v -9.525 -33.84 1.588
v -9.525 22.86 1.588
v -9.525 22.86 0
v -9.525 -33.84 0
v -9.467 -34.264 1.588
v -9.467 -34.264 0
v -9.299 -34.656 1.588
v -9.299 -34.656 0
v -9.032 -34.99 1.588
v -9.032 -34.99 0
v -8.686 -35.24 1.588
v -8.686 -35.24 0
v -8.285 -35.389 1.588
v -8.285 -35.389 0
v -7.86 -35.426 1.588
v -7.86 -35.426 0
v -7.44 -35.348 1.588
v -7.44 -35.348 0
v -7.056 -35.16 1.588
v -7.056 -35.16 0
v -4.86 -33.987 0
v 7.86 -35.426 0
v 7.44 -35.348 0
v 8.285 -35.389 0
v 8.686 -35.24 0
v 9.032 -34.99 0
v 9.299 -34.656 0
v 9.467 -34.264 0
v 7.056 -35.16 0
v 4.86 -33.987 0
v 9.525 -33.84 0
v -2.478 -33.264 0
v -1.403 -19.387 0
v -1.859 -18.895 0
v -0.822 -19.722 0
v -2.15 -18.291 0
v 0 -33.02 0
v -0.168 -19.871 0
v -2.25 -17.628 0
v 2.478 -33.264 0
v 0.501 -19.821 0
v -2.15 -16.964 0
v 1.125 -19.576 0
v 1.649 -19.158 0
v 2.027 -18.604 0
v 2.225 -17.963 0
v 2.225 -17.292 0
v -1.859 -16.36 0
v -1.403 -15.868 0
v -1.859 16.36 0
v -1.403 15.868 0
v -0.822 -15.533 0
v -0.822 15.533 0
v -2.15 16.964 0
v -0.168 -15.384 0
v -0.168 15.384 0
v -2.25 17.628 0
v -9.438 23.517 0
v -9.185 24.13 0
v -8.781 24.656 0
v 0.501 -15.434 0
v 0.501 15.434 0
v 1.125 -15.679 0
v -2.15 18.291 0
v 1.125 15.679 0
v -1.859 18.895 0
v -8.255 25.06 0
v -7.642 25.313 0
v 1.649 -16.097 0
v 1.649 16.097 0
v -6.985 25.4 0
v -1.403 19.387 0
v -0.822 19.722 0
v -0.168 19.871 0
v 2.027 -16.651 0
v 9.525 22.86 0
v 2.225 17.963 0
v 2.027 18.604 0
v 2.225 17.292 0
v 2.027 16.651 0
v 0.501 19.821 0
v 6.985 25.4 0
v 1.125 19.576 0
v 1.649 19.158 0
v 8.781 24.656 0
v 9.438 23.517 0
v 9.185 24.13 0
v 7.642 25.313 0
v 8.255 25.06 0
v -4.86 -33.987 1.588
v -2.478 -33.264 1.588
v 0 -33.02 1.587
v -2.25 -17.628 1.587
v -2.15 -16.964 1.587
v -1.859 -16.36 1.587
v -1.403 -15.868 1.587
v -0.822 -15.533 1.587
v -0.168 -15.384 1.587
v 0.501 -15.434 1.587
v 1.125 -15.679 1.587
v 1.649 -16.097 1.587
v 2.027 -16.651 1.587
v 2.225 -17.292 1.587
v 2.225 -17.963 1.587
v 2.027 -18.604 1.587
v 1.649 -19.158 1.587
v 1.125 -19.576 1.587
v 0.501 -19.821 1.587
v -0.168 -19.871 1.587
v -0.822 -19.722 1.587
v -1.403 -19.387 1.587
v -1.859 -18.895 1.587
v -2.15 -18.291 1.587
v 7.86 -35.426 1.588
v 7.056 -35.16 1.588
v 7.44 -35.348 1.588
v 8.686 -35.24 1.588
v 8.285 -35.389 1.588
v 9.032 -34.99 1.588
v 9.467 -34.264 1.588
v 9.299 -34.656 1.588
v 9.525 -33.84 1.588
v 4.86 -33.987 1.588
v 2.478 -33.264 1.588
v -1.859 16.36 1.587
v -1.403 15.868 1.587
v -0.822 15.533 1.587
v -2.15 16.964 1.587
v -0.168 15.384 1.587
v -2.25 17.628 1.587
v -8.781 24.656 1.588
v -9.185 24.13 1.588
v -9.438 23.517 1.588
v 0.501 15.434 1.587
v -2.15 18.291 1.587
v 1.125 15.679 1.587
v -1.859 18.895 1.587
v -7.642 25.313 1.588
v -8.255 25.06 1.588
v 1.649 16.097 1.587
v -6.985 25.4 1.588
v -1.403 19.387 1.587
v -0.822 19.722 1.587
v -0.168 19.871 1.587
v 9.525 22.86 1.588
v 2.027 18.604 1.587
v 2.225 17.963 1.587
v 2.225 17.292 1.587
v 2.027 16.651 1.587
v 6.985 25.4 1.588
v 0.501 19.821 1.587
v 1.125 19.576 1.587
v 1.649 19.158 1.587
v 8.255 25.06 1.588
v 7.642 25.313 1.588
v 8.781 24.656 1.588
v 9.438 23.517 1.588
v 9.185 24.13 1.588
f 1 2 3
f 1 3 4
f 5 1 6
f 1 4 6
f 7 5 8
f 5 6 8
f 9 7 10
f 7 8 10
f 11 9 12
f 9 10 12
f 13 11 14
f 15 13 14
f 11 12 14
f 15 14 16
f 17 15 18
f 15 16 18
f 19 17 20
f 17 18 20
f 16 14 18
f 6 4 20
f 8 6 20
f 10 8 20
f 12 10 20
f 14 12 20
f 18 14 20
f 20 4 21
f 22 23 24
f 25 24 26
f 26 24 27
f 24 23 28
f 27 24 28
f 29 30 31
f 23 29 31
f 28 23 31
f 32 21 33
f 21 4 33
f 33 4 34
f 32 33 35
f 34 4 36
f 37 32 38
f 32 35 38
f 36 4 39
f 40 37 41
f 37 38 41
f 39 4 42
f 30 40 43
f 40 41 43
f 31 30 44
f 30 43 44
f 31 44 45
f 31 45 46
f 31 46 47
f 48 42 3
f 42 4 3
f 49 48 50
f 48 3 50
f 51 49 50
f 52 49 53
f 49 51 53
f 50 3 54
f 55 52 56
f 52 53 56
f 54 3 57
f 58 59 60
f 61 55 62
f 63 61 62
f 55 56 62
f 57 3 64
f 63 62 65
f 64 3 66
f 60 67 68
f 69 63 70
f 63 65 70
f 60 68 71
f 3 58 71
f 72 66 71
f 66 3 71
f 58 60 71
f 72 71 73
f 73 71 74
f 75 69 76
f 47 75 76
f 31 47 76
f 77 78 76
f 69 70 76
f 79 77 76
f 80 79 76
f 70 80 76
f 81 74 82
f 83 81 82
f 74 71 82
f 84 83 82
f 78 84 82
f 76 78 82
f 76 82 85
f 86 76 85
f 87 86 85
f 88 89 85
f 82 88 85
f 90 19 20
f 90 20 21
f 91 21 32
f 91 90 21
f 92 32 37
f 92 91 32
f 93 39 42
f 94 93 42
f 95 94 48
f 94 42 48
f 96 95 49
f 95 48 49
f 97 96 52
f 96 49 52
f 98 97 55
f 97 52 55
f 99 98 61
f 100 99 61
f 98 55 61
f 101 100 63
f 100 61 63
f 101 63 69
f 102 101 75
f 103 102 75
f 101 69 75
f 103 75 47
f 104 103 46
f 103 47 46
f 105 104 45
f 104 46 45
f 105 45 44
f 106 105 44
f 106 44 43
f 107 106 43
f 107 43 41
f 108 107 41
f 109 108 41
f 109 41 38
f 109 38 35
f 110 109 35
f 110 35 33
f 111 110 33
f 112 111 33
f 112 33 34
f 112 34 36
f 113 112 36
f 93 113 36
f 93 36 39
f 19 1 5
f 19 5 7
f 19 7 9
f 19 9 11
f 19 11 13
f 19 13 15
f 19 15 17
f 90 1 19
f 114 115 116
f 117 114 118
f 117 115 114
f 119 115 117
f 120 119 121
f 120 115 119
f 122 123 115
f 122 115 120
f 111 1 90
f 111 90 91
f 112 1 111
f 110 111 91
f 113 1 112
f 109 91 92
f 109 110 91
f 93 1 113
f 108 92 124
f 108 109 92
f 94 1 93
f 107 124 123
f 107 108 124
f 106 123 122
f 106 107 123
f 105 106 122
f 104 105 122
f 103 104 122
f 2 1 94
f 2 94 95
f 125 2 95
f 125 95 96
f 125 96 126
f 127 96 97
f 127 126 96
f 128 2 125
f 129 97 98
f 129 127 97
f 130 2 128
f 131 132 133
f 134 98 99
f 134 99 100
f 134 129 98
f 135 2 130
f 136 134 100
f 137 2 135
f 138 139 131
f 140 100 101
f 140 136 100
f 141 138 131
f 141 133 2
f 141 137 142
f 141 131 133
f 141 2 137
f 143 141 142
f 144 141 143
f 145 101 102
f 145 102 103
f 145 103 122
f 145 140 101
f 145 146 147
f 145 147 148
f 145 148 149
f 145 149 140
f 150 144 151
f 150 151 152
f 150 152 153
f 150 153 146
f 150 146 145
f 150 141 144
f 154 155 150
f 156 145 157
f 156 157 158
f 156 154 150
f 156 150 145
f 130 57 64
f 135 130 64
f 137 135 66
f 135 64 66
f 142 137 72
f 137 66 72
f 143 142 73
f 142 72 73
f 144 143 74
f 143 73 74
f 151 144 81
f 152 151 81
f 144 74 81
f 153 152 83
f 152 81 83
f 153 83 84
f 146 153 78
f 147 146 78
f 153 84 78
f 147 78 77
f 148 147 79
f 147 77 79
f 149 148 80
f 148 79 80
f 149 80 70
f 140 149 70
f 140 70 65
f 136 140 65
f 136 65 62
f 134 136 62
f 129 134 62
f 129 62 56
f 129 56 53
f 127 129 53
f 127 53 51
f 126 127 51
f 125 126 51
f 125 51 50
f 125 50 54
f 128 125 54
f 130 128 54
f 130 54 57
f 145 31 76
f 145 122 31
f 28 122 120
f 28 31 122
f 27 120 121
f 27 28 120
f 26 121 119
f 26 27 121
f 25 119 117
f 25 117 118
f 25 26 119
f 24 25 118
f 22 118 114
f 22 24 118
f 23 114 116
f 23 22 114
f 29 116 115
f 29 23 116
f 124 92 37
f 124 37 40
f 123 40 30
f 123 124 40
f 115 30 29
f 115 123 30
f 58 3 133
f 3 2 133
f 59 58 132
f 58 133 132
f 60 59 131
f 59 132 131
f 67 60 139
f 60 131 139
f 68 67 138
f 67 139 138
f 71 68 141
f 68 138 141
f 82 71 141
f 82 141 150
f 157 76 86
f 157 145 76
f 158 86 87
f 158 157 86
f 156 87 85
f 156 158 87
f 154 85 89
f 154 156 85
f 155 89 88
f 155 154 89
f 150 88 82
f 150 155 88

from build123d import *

# Parameters (mm, degrees)
SKETCH1_W            = 19.05
SKETCH1_H            = 50.8
BOSS_EXTRUDE1_DEPTH  = 1.5875
M4_CLEARANCE_HOLE1_D = 4.5
SKETCH4_W            = 19.05
SKETCH4_H            = 7.62
BOSS_EXTRUDE2_DEPTH  = 1.5875
FILLET1_R            = 2.54
BOSS_EXTRUDE3_DEPTH  = 1.5875
FILLET2_R            = 1.5875


with BuildPart() as part:
    # Sketch1 → Boss-Extrude1 (new body)
    with BuildSketch(Plane.XY):
        Rectangle(SKETCH1_W, SKETCH1_H)
    extrude(amount=BOSS_EXTRUDE1_DEPTH)

    # M4 Clearance Hole1 (through all)
    with Locations(Plane.XY.offset(1.5875)):
        with Locations((0, 17.6276), (0, -17.6276)):
            Hole(M4_CLEARANCE_HOLE1_D / 2)

    # Sketch4 → Boss-Extrude2 (add)
    with BuildSketch(Plane.XY.offset(1.5875)):
        with Locations((0, -29.21)):
            Rectangle(SKETCH4_W, SKETCH4_H)
    extrude(amount=-BOSS_EXTRUDE2_DEPTH)

    # Fillet1
    fillet1_edges = [part.edges().sort_by_distance(p)[0] for p in [
        (-9.525, 25.4, 0.79375),
        (9.525, 25.4, 0.79375),
    ]]
    fillet(fillet1_edges, radius=FILLET1_R)

    # Sketch5 → Boss-Extrude3 (add)
    with BuildSketch(Plane.XY.offset(1.5875)):
        with BuildLine():
            Line((1.5e-08, -33.02), (-9.525, -33.02))
            Line((-9.525, -33.02), (-9.525, -37.319739587))
            ThreePointArc((-9.525, -37.319739587), (-5.225260406, -34.144739584), (1.5e-08, -33.02))
        make_face()
        with BuildLine():
            Line((9.525, -33.02), (1.5e-08, -33.02))
            ThreePointArc((1.5e-08, -33.02), (5.225260419, -34.14473959), (9.525, -37.319739587))
            Line((9.525, -37.319739587), (9.525, -33.02))
        make_face()
    extrude(amount=-BOSS_EXTRUDE3_DEPTH)

    # Fillet2
    fillet2_edges = [part.edges().sort_by_distance(p)[0] for p in [
        (-9.525, -37.319739587, 0.79375),
        (9.525, -37.319739587, 0.79375),
    ]]
    fillet(fillet2_edges, radius=FILLET2_R)


solid = part.part
